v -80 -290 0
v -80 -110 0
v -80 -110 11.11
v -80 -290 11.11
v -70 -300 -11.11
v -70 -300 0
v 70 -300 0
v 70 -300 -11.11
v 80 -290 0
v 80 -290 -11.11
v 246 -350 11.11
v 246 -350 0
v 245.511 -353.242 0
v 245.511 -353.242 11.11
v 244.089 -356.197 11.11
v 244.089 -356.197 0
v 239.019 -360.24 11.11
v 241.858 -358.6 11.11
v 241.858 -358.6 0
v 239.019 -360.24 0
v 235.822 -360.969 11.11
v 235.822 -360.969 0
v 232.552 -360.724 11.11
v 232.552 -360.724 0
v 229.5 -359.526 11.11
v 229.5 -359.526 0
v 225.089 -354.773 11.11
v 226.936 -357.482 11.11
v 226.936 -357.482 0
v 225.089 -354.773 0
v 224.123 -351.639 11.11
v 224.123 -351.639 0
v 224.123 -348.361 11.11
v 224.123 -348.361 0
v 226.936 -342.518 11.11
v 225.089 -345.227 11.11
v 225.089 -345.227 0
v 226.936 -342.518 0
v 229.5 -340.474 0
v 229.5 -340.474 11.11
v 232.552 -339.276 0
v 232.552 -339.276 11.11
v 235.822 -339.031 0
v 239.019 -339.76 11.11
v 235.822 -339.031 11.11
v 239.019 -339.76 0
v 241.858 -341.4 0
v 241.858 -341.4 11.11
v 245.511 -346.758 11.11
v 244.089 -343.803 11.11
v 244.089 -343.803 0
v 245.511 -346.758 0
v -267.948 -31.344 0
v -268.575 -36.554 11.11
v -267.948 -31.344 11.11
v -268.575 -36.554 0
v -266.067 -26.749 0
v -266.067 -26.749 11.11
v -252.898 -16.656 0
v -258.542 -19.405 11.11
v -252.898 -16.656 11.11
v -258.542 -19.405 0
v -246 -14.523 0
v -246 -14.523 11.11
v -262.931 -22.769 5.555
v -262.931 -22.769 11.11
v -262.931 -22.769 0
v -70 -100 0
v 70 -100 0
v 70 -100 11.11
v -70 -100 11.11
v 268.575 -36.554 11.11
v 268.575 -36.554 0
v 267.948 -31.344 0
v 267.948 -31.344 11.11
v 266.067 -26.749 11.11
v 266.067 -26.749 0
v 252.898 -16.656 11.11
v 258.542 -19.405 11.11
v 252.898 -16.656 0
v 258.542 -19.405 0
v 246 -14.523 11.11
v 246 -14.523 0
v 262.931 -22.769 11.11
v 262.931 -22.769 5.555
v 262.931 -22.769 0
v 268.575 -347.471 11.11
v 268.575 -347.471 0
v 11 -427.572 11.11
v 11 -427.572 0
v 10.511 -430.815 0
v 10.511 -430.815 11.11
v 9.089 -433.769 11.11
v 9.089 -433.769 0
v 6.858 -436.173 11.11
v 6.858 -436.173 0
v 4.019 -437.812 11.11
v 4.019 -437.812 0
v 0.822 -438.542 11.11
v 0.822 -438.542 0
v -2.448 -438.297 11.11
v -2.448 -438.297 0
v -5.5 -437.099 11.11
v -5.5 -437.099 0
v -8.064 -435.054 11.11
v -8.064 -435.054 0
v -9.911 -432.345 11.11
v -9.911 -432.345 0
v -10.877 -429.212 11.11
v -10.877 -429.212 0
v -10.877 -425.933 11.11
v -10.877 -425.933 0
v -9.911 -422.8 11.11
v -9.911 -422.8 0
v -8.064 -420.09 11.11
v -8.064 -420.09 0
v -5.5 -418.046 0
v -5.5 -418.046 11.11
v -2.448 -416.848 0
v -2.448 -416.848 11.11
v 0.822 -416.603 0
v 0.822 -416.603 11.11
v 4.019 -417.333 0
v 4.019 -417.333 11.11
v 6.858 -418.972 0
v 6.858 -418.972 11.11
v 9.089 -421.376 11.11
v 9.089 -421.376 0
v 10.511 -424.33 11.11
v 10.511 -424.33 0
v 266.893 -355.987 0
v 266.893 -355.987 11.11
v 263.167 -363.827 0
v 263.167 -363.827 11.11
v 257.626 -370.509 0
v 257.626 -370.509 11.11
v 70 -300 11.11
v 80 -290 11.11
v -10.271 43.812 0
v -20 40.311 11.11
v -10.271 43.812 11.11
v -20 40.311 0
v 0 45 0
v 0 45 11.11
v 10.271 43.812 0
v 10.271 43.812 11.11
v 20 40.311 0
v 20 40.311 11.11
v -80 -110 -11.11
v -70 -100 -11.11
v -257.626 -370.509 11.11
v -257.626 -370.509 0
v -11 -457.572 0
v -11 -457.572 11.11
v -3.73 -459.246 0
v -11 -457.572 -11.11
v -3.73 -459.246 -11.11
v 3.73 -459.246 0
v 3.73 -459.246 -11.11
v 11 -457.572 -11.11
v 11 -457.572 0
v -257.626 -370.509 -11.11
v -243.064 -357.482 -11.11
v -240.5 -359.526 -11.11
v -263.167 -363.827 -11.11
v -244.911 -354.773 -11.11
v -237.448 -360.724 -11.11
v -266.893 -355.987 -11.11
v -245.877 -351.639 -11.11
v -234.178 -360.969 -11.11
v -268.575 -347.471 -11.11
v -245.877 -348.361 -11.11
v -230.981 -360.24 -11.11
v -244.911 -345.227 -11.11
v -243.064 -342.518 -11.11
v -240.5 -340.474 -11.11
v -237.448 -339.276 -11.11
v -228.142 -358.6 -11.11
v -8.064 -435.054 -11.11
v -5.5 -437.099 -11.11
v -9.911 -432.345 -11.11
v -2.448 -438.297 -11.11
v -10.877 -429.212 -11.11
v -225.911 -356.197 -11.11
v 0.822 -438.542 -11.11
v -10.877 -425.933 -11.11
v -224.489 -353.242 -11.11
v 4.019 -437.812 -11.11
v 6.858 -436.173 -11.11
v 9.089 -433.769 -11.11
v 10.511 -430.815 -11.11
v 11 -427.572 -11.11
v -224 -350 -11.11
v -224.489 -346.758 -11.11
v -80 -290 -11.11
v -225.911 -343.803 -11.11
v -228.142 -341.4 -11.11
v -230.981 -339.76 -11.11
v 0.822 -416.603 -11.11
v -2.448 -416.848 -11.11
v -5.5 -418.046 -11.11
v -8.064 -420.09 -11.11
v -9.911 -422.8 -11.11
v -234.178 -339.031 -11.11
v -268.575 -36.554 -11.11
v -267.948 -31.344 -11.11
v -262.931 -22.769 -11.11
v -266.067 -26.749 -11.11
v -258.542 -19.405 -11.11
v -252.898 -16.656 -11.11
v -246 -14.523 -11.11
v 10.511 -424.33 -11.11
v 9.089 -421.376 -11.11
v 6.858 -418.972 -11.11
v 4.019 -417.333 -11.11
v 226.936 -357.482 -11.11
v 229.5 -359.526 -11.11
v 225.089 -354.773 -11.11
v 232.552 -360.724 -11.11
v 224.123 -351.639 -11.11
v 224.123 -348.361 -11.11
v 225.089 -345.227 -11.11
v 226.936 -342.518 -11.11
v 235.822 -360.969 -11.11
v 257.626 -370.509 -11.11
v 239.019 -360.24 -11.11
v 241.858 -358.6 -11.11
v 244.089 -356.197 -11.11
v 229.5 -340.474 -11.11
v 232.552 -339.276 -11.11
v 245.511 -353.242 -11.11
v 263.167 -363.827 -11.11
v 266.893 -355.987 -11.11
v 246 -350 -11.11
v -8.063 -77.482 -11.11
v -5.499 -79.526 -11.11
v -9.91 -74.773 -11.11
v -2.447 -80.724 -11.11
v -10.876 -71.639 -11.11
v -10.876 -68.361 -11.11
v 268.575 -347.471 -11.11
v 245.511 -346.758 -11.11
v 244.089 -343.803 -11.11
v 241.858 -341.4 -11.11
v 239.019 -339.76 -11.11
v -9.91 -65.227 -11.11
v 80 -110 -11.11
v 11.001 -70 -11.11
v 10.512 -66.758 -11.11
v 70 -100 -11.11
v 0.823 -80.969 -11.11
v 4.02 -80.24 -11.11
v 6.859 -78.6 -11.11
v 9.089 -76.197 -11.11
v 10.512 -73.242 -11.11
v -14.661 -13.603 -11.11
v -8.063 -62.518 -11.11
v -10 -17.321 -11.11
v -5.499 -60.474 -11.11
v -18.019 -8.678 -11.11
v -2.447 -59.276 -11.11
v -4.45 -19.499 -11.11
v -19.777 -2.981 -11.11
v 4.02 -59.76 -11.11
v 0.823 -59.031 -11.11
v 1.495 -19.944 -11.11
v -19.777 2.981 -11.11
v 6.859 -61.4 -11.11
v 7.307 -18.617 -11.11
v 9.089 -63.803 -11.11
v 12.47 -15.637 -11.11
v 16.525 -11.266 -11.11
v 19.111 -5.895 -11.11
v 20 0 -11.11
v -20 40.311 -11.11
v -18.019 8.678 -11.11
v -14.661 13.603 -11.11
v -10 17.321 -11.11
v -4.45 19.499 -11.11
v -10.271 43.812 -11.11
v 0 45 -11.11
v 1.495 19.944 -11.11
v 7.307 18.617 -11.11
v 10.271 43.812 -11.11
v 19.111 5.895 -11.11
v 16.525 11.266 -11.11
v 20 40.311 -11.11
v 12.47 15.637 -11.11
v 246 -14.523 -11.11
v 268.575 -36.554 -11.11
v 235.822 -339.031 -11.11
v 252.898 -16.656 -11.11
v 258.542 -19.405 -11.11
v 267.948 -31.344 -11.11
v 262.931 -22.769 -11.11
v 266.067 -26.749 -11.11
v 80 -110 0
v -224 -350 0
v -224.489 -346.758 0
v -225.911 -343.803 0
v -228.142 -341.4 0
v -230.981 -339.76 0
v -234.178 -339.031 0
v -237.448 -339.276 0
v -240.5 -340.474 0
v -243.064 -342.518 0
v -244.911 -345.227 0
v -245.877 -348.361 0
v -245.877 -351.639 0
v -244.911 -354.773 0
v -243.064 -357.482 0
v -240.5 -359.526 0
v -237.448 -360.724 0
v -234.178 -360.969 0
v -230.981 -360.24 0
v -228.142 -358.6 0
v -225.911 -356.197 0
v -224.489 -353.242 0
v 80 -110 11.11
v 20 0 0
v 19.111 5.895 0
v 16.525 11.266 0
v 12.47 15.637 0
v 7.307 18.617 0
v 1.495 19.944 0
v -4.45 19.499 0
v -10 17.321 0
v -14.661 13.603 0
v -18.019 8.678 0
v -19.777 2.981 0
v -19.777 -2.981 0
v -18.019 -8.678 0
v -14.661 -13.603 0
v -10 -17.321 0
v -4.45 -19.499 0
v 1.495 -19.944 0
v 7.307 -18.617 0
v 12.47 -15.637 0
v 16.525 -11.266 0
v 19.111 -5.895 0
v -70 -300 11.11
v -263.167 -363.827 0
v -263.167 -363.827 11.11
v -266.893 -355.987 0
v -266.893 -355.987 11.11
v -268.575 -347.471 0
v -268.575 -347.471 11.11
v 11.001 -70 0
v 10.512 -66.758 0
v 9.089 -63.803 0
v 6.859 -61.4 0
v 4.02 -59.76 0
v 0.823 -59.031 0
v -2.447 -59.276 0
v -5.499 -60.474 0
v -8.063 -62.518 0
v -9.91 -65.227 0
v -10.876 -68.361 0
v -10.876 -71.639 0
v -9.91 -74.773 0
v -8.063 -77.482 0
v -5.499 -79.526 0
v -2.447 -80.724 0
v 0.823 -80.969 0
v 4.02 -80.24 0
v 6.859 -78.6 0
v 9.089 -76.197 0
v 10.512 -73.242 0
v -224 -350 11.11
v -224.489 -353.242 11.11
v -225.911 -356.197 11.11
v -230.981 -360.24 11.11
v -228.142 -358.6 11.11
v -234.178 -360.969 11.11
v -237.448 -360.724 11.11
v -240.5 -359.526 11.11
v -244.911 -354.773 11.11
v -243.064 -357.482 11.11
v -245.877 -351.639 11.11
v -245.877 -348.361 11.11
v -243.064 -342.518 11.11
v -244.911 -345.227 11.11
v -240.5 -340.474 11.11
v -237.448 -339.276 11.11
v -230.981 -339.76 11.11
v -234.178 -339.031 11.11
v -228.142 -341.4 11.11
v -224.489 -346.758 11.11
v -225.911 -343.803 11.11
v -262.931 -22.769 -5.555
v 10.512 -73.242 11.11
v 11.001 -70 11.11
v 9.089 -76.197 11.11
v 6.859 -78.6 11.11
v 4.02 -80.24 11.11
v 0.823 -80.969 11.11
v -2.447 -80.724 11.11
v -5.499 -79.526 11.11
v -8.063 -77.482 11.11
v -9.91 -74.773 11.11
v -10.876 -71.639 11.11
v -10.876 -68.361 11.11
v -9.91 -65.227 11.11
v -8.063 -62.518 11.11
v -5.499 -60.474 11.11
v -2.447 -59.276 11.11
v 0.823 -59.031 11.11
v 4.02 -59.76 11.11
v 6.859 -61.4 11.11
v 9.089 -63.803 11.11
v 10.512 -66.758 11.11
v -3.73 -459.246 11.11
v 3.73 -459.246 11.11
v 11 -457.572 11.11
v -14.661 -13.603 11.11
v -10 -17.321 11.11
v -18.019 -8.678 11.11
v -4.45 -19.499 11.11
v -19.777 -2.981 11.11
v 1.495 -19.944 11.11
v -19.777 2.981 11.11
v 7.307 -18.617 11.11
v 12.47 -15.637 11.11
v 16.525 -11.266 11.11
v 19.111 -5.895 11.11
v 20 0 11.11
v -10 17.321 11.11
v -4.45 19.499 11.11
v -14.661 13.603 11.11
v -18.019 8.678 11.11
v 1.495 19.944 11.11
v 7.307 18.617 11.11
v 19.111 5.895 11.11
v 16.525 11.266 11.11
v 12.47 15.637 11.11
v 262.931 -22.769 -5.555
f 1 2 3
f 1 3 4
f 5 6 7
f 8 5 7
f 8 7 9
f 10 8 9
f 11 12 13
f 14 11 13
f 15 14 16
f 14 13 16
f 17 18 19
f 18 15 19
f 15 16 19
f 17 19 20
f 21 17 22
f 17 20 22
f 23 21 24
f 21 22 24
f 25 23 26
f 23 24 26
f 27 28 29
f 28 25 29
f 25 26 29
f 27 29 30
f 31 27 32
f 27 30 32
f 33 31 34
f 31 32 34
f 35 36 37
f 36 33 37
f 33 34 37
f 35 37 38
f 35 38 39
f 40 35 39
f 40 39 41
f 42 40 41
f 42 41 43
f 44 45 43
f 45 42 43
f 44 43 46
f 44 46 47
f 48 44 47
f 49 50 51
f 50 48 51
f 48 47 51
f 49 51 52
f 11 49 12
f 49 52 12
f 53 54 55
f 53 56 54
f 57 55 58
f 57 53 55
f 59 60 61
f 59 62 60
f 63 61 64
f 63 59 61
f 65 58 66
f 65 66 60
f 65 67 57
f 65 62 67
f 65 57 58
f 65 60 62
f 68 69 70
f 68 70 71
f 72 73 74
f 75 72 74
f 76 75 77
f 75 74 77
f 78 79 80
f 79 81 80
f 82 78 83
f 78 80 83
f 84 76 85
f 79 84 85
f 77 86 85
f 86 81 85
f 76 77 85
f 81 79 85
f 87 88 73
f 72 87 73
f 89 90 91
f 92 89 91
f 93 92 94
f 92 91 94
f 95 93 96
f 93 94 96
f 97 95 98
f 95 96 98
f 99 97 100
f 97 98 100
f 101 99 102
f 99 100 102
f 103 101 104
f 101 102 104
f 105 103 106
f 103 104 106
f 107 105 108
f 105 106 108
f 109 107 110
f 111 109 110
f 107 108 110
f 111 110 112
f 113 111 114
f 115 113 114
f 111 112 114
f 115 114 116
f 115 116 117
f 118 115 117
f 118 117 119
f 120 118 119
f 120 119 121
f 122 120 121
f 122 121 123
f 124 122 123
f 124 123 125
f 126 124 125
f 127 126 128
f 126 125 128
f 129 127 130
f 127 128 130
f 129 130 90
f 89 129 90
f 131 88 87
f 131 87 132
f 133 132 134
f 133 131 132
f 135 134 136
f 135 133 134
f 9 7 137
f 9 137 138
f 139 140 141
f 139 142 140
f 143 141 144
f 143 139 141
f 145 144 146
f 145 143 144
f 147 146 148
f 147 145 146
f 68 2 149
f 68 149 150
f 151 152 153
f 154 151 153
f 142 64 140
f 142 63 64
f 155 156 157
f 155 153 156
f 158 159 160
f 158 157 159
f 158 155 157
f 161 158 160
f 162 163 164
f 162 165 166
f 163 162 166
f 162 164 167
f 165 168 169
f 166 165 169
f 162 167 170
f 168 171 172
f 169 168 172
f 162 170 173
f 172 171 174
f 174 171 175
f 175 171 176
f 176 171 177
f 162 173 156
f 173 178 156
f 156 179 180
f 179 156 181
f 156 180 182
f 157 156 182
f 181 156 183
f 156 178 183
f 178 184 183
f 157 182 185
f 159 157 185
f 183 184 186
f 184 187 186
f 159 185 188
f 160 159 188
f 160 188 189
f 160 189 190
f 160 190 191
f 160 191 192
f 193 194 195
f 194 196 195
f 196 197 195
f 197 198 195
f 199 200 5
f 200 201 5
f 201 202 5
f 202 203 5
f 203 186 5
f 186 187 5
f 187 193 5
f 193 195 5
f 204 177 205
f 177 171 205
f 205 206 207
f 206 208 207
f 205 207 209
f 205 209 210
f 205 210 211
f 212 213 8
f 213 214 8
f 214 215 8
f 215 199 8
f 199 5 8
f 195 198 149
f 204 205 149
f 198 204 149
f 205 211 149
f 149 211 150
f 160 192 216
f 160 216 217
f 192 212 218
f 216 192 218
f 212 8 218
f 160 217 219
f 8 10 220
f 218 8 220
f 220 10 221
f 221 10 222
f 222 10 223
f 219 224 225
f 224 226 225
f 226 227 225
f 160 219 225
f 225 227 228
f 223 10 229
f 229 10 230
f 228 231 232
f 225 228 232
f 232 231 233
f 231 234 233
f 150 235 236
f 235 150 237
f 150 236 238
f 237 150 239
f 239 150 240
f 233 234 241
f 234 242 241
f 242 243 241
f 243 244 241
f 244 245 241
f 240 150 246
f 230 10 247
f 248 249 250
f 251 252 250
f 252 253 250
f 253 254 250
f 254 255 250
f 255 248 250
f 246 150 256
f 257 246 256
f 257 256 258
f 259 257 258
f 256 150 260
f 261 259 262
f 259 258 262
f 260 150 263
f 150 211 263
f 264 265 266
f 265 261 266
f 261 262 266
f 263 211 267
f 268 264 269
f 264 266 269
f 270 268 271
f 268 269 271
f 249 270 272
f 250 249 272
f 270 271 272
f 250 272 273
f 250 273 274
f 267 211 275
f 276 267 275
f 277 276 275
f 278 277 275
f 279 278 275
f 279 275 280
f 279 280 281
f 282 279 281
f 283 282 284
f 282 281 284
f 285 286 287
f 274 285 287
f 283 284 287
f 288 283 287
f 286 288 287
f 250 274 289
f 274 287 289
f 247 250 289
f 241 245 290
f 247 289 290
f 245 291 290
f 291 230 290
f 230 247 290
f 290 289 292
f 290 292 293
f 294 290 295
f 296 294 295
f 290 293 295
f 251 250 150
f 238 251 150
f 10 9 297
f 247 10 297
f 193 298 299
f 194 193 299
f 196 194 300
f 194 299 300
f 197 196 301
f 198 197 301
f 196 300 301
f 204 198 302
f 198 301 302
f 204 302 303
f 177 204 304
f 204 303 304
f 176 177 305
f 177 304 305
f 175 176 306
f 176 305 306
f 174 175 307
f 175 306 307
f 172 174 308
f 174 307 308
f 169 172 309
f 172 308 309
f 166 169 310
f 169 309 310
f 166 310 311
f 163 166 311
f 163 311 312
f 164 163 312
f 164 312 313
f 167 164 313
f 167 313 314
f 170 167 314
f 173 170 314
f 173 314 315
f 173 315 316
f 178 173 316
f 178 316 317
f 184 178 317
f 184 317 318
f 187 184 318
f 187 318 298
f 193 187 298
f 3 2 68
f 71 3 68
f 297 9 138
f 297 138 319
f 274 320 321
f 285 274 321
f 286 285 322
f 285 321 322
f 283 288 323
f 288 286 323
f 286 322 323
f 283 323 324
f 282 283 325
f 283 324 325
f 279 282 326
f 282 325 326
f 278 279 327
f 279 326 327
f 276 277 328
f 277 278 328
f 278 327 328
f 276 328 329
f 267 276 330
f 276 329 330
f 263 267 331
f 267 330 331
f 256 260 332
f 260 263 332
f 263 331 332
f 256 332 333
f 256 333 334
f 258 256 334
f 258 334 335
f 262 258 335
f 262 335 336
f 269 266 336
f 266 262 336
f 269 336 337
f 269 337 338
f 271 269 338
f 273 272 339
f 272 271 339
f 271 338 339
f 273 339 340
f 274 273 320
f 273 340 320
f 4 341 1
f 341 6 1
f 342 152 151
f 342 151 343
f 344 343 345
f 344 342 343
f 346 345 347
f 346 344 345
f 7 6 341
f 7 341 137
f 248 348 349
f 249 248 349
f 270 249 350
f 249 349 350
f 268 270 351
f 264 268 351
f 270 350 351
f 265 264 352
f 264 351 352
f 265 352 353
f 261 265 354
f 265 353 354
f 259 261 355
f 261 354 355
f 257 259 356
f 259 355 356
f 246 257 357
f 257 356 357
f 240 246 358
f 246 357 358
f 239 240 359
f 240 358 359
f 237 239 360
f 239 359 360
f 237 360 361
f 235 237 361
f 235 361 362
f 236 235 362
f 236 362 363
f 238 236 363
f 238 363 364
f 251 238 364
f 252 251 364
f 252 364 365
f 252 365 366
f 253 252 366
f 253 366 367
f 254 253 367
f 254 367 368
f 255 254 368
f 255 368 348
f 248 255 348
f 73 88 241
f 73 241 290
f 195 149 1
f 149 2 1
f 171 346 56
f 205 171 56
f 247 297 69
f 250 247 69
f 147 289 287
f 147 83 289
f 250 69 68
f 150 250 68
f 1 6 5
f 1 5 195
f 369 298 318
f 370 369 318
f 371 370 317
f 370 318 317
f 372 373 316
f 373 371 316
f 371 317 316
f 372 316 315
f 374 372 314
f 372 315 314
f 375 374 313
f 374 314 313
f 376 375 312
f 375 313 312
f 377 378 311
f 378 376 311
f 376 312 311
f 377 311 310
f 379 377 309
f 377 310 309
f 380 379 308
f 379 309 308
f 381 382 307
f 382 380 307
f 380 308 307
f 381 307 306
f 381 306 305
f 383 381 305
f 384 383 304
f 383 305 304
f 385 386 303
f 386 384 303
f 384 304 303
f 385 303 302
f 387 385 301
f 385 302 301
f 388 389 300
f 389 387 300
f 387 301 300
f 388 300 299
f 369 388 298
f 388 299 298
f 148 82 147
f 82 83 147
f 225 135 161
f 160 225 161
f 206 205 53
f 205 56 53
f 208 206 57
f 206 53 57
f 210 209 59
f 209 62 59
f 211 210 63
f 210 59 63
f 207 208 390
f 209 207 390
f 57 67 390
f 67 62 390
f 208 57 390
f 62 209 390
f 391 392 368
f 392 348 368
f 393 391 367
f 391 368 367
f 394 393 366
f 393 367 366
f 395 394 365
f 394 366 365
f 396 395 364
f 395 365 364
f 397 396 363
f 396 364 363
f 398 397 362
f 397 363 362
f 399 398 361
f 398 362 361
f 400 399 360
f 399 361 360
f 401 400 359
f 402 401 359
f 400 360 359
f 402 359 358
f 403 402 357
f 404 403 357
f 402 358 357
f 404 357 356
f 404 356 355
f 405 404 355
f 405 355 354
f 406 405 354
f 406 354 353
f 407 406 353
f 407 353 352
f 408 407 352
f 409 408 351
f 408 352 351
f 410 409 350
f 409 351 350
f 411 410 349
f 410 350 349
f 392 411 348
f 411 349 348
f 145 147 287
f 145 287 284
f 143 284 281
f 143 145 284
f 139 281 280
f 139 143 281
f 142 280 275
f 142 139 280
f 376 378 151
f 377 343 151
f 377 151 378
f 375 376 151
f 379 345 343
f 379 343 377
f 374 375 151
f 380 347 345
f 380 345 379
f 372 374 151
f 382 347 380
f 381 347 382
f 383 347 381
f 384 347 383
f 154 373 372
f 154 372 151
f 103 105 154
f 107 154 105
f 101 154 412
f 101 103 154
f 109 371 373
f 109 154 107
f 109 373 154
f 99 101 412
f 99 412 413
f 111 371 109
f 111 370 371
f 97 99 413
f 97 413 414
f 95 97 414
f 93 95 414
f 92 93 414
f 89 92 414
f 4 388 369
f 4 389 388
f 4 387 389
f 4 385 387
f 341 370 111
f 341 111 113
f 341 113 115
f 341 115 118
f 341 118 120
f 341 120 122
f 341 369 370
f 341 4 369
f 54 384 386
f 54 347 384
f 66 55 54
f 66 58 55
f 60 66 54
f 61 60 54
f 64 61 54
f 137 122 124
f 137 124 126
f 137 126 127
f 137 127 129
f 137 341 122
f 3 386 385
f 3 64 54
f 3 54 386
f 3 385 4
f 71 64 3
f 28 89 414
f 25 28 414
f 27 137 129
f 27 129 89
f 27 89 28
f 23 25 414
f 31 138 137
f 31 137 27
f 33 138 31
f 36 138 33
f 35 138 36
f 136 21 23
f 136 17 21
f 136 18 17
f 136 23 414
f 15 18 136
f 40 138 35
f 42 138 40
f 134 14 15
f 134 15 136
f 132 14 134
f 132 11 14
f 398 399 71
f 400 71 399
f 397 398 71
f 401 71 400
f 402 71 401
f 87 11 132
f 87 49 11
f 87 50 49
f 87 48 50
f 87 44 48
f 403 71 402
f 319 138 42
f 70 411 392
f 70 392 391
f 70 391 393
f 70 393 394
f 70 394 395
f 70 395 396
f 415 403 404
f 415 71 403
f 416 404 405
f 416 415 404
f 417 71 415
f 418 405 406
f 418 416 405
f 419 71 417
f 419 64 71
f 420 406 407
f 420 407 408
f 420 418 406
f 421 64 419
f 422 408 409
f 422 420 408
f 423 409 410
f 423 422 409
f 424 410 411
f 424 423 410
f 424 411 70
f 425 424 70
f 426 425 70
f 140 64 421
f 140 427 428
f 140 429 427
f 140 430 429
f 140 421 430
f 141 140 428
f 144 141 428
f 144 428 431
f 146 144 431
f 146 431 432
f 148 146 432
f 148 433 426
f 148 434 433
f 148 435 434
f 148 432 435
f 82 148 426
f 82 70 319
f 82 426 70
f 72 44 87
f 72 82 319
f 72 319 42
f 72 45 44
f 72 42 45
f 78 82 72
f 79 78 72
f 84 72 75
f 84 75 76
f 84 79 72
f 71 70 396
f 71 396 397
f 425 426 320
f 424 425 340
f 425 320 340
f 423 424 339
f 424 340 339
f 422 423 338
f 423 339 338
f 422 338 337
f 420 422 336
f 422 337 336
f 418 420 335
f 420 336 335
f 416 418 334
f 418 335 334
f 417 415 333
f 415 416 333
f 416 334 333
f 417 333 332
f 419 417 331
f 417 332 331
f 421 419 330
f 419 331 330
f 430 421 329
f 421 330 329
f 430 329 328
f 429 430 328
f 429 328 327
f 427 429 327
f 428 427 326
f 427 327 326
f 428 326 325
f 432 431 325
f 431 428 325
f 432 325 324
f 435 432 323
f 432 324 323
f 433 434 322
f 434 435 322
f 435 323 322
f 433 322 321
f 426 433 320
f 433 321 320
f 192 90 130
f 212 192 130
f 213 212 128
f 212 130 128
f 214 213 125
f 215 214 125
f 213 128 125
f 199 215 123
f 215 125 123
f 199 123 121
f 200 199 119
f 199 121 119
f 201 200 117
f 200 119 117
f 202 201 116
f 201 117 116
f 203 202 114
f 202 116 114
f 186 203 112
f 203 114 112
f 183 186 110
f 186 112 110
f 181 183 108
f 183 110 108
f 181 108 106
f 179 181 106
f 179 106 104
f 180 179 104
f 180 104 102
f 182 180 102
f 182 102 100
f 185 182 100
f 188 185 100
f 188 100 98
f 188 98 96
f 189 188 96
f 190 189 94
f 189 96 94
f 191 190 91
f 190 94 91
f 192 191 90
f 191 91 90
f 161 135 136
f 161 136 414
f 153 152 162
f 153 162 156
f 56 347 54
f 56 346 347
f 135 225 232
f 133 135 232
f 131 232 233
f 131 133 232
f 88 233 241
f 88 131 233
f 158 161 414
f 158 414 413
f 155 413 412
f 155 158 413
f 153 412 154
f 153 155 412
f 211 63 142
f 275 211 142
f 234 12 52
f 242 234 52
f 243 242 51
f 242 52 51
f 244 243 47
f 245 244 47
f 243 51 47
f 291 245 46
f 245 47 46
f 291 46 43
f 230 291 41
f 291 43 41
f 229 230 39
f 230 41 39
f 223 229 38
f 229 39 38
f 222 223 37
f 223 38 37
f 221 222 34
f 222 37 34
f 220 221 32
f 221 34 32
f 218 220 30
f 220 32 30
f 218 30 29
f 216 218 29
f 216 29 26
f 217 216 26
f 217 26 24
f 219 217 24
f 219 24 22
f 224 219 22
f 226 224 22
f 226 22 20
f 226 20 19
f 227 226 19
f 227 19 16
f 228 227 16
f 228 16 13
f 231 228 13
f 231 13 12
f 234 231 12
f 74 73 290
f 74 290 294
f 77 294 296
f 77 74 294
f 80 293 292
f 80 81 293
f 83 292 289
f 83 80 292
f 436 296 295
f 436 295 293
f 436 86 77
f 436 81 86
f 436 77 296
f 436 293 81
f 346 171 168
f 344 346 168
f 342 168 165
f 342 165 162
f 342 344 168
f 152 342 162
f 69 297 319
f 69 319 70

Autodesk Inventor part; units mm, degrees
ref_plane "YZ Plane" through (0, 0, 0) normal (1, 0, 0) x (0, 1, 0)
ref_plane "XZ Plane" through (0, 0, 0) normal (0, 1, 0) x (-1, 0, 0)
ref_plane "XY Plane" through (0, 0, 0) normal (0, 0, 1) x (1, 0, 0)
sketch "Sketch1" plane through (0, 0, 0) normal (0, 0, 1) x (1, 0, 0)
  circle A0 centre (0, 0) radius 20
  circle A1 centre (-235, -350) radius 11
  circle A2 centre (235, -350) radius 11
  arc A3 (257.6264, -370.5094) -> (260.9808, -323.1206) centre (233.6625, -345) ccw
  circle A4 centre (0.0008, -70) radius 11
  line L0 (70, -100) -> (-70, -100)
  line L1 (-80, -110) -> (-80, -290)
  line L2 (-70, -300) -> (70, -300)
  line L3 (80, -290) -> (80, -110)
  line L4 (80, -100) -> (-80, -300) construction
  line L5 (-80, -100) -> (80, -300) construction
  line L6 (0, 64.9697) -> (0, -492.5476)
  arc A5 (-260.9808, -323.1206) -> (-257.6264, -370.5094) centre (-233.6625, -345) ccw
  line L7 (-80, -110) -> (-70, -100)
  line L8 (80, -110) -> (70, -100)
  line L9 (70, -300) -> (80, -290)
  line L10 (-70, -300) -> (-80, -290)
  arc A6 (20, 40.3113) -> (-20, 40.3113) centre (0, 0) ccw
  circle A7 centre (0, -427.5724) radius 11
  line L11 (-257.6264, -370.5094) -> (-11, -457.5724)
  arc A8 (-11, -457.5724) -> (11, -457.5724) centre (0, -426.4123) ccw
  line L12 (257.6264, -370.5094) -> (11, -457.5724)
  line L13 (-11, -457.5724) -> (11, -457.5724) construction
  line L14 (268.5751, -347.4713) -> (268.5751, -36.5544)
  line L15 (246, -14.5226) -> (20, 40.3113)
  line L16 (-268.5751, -347.4713) -> (-268.5751, -36.5544)
  line L17 (-246, -14.5226) -> (-20, 40.3113)
  line L18 (-268.5751, -36.5544) -> (-268.5751, -20) construction
  line L19 (-268.5751, -20) -> (-246, -14.5226) construction
  spline S0 degree 2 poles (-268.5751, -36.5544) (-268.5751, -20) (-246, -14.5226) knots 1 1 1 2 2 2
  line L20 (268.5751, -36.5544) -> (268.5751, -20) construction
  line L21 (268.5751, -20) -> (246, -14.5226) construction
  spline S1 degree 2 poles (268.5751, -36.5544) (268.5751, -20) (246, -14.5226) knots 1 1 1 2 2 2
  point P0 (0, -200)
  point P1 (0, -200)
  dimension "d0" = 40
  dimension "d3" = 22
  dimension "d4" = 22
  dimension "d9" = 35
  dimension "d33" = 22
  dimension "d35" = 160
  dimension "d36" = 200
  dimension "d37" = 70
  dimension "d38" = 30
  dimension "d39" = 10
  dimension "d40" = 10
  dimension "d41" = 10
  dimension "d42" = 10
  dimension "d43" = 10
  dimension "d44" = 10
  dimension "d45" = 10
  dimension "d46" = 10
  dimension "d47" = 45
  dimension "d50" = 22
  dimension "d51" = 30
extrude "Extrusion3" add sketch "Sketch1" along normal mid plane 22.22 contours A0 L6 A6 L15 S1 L14 A3 L12 A8 A7 L2 L9 L3 L8 L0 A4 | A0 L6 A4 L0 L7 L1 L10 L2 A7 A8 L11 A5 L16 S0 L17 A6
equation "\"d40\" = d39"
equation "\"d42\" = d41"
equation "\"d43\" = d41"
equation "\"d44\" = d43"
equation "\"d45\" = d41"
equation "\"d46\" = d45"
properties part number "Corpo_Suporte_4_Cabos_Modelo2"
